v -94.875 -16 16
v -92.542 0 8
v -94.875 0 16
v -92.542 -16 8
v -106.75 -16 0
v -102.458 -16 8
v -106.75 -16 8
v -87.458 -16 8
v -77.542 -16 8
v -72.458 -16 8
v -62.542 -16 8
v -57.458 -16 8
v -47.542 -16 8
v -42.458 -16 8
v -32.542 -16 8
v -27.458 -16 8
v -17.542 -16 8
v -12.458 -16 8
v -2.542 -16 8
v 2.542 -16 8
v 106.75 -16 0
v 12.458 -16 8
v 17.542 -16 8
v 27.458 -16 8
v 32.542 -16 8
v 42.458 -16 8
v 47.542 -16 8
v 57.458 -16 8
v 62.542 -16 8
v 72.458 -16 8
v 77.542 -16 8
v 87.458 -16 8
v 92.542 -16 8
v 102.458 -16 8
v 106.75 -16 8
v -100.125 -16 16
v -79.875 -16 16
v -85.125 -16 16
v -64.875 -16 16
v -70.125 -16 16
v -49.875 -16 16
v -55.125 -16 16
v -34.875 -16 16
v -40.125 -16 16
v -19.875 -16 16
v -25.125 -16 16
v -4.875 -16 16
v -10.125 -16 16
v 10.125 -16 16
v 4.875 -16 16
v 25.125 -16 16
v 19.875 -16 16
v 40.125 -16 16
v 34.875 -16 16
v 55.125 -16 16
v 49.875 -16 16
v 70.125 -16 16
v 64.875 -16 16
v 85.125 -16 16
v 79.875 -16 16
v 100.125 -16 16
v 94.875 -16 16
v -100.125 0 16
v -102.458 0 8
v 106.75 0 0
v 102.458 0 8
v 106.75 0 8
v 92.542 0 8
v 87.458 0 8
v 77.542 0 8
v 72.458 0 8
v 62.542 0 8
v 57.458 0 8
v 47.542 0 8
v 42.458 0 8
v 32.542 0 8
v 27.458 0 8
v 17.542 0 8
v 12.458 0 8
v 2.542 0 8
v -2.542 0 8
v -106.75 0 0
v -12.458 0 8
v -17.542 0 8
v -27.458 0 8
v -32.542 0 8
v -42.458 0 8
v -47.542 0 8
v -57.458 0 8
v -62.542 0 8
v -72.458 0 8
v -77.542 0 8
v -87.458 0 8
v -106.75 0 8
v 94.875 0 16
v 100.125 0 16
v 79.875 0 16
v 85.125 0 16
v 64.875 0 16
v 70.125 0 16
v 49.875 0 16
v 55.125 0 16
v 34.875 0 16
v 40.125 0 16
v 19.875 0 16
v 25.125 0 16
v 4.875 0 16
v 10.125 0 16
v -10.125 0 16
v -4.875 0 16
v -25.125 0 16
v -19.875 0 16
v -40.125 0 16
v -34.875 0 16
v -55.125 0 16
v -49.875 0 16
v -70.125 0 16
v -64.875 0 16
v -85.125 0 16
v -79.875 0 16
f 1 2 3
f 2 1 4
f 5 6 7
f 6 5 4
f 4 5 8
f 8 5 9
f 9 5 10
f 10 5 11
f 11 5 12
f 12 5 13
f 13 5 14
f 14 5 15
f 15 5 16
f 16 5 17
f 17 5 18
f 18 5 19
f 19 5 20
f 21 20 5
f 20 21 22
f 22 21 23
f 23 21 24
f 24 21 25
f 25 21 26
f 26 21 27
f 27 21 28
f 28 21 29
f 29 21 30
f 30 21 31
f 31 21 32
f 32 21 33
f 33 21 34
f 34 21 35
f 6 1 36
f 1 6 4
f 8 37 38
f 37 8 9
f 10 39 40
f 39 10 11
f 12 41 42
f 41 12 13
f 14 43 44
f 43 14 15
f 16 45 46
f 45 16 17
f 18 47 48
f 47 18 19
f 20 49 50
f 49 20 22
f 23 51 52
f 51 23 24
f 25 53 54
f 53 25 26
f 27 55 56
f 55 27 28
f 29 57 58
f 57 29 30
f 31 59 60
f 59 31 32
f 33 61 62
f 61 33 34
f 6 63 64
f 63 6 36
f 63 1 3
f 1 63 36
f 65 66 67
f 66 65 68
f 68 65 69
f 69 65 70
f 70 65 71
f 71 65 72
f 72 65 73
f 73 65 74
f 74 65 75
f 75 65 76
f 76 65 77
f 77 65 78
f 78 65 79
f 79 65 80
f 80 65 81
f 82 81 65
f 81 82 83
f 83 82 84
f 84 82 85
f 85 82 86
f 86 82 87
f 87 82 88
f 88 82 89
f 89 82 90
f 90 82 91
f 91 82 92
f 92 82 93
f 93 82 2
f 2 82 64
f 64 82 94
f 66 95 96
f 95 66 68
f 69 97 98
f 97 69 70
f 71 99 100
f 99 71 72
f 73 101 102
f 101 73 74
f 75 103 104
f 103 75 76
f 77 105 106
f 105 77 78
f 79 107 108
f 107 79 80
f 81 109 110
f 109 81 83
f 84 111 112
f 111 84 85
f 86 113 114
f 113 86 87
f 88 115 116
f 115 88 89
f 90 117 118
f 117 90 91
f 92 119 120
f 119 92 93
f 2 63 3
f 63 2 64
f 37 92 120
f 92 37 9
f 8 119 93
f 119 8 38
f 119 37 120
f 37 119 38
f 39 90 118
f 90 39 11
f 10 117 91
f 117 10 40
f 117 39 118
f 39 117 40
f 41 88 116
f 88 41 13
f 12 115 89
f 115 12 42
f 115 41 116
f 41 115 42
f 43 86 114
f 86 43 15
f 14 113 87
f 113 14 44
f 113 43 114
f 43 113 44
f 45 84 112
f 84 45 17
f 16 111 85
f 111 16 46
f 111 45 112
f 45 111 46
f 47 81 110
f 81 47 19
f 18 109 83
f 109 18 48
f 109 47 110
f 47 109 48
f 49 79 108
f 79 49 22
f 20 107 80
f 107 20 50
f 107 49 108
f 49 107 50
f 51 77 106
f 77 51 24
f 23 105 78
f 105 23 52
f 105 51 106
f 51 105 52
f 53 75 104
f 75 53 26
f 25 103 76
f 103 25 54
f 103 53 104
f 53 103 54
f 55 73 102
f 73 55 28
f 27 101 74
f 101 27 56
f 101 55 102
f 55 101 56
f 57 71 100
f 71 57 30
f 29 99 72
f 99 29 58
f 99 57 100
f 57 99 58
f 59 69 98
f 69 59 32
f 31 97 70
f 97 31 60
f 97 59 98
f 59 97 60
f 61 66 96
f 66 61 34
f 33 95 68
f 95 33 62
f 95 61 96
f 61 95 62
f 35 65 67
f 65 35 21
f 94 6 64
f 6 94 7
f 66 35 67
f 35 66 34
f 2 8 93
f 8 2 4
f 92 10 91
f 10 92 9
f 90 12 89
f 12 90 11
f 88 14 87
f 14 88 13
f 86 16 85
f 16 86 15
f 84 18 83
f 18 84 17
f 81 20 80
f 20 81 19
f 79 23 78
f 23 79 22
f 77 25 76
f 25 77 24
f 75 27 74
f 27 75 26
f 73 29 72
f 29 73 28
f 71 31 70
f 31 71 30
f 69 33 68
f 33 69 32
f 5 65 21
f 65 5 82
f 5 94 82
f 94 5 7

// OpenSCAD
$fn = 32;

// ----------------------------------------------------------------------
// Toothed rack, 14 teeth
// 15 mm pitch, 8 mm teeth
// ----------------------------------------------------------------------

// --- parameters (mm) ---
bar_w = 16;      // bar width (Y)
bar_h = 8;       // bar height (Z)
teeth = 14;      // number of teeth
pitch = 15;      // tooth pitch
tooth_h = 8;     // tooth height above the bar
root_w = 10.5;   // tooth width at the root
crest_w = 5.25;  // tooth width at the crest

// --- derived feature positions (mm) ---
span = (teeth - 1) * pitch;  // = 195   distance between the outer teeth
bar_l = span + root_w + 8;   // = 213.5   bar length: teeth plus 4 mm at each end
tooth_x = -span / 2;         // = -97.5   X of the first tooth
height = bar_h + tooth_h;    // = 16   overall height
feature_centers = [
  [tooth_x + 0 * pitch, -bar_w / 2],
  [tooth_x + 1 * pitch, -bar_w / 2],
  [tooth_x + 2 * pitch, -bar_w / 2],
  [tooth_x + 3 * pitch, -bar_w / 2],
  [tooth_x + 4 * pitch, -bar_w / 2],
  [tooth_x + 5 * pitch, -bar_w / 2],
  [tooth_x + 6 * pitch, -bar_w / 2],
  [tooth_x + 7 * pitch, -bar_w / 2],
  [tooth_x + 8 * pitch, -bar_w / 2],
  [tooth_x + 9 * pitch, -bar_w / 2],
  [tooth_x + 10 * pitch, -bar_w / 2],
  [tooth_x + 11 * pitch, -bar_w / 2],
  [tooth_x + 12 * pitch, -bar_w / 2],
  [tooth_x + 13 * pitch, -bar_w / 2]
];   // tooth centre line, drives the tooth loop

// bar with a rack of teeth, one extruded trapezoium per centre
module rack_tooth() {
  linear_extrude(height = bar_w)
    polygon(points = [
      [0, 0],
      [root_w, 0],
      [root_w / 2 + crest_w / 2, tooth_h + 1],
      [root_w / 2 - crest_w / 2, tooth_h + 1]
    ]);
}

union() {
  translate([-bar_l / 2, -bar_w, 0]) cube([bar_l, bar_w, bar_h]);
  for (centre = feature_centers)
    translate([centre[0] - root_w / 2, 0, bar_h - 1]) rotate([90, 0, 0]) rack_tooth();
}
